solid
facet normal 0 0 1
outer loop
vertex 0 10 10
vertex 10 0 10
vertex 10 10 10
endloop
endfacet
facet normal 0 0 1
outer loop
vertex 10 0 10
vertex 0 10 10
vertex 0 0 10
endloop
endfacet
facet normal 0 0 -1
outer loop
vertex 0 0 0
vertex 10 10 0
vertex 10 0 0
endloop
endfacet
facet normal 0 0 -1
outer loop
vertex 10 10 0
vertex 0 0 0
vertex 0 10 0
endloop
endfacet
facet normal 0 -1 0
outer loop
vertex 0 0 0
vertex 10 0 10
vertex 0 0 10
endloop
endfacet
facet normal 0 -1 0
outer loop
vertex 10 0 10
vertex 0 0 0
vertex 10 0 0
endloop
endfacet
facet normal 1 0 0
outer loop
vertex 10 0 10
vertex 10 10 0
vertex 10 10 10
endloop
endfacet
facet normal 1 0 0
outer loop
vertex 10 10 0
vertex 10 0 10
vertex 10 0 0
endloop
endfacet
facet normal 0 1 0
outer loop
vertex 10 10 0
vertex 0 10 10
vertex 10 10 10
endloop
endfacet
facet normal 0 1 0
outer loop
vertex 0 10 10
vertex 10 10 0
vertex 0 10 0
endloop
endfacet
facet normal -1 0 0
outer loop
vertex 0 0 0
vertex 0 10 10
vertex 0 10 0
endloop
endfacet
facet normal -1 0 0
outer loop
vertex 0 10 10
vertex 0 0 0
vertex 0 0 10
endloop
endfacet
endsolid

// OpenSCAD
// model23: string literals (echo only, no geometry)
echo("hello world");
cube(10);
